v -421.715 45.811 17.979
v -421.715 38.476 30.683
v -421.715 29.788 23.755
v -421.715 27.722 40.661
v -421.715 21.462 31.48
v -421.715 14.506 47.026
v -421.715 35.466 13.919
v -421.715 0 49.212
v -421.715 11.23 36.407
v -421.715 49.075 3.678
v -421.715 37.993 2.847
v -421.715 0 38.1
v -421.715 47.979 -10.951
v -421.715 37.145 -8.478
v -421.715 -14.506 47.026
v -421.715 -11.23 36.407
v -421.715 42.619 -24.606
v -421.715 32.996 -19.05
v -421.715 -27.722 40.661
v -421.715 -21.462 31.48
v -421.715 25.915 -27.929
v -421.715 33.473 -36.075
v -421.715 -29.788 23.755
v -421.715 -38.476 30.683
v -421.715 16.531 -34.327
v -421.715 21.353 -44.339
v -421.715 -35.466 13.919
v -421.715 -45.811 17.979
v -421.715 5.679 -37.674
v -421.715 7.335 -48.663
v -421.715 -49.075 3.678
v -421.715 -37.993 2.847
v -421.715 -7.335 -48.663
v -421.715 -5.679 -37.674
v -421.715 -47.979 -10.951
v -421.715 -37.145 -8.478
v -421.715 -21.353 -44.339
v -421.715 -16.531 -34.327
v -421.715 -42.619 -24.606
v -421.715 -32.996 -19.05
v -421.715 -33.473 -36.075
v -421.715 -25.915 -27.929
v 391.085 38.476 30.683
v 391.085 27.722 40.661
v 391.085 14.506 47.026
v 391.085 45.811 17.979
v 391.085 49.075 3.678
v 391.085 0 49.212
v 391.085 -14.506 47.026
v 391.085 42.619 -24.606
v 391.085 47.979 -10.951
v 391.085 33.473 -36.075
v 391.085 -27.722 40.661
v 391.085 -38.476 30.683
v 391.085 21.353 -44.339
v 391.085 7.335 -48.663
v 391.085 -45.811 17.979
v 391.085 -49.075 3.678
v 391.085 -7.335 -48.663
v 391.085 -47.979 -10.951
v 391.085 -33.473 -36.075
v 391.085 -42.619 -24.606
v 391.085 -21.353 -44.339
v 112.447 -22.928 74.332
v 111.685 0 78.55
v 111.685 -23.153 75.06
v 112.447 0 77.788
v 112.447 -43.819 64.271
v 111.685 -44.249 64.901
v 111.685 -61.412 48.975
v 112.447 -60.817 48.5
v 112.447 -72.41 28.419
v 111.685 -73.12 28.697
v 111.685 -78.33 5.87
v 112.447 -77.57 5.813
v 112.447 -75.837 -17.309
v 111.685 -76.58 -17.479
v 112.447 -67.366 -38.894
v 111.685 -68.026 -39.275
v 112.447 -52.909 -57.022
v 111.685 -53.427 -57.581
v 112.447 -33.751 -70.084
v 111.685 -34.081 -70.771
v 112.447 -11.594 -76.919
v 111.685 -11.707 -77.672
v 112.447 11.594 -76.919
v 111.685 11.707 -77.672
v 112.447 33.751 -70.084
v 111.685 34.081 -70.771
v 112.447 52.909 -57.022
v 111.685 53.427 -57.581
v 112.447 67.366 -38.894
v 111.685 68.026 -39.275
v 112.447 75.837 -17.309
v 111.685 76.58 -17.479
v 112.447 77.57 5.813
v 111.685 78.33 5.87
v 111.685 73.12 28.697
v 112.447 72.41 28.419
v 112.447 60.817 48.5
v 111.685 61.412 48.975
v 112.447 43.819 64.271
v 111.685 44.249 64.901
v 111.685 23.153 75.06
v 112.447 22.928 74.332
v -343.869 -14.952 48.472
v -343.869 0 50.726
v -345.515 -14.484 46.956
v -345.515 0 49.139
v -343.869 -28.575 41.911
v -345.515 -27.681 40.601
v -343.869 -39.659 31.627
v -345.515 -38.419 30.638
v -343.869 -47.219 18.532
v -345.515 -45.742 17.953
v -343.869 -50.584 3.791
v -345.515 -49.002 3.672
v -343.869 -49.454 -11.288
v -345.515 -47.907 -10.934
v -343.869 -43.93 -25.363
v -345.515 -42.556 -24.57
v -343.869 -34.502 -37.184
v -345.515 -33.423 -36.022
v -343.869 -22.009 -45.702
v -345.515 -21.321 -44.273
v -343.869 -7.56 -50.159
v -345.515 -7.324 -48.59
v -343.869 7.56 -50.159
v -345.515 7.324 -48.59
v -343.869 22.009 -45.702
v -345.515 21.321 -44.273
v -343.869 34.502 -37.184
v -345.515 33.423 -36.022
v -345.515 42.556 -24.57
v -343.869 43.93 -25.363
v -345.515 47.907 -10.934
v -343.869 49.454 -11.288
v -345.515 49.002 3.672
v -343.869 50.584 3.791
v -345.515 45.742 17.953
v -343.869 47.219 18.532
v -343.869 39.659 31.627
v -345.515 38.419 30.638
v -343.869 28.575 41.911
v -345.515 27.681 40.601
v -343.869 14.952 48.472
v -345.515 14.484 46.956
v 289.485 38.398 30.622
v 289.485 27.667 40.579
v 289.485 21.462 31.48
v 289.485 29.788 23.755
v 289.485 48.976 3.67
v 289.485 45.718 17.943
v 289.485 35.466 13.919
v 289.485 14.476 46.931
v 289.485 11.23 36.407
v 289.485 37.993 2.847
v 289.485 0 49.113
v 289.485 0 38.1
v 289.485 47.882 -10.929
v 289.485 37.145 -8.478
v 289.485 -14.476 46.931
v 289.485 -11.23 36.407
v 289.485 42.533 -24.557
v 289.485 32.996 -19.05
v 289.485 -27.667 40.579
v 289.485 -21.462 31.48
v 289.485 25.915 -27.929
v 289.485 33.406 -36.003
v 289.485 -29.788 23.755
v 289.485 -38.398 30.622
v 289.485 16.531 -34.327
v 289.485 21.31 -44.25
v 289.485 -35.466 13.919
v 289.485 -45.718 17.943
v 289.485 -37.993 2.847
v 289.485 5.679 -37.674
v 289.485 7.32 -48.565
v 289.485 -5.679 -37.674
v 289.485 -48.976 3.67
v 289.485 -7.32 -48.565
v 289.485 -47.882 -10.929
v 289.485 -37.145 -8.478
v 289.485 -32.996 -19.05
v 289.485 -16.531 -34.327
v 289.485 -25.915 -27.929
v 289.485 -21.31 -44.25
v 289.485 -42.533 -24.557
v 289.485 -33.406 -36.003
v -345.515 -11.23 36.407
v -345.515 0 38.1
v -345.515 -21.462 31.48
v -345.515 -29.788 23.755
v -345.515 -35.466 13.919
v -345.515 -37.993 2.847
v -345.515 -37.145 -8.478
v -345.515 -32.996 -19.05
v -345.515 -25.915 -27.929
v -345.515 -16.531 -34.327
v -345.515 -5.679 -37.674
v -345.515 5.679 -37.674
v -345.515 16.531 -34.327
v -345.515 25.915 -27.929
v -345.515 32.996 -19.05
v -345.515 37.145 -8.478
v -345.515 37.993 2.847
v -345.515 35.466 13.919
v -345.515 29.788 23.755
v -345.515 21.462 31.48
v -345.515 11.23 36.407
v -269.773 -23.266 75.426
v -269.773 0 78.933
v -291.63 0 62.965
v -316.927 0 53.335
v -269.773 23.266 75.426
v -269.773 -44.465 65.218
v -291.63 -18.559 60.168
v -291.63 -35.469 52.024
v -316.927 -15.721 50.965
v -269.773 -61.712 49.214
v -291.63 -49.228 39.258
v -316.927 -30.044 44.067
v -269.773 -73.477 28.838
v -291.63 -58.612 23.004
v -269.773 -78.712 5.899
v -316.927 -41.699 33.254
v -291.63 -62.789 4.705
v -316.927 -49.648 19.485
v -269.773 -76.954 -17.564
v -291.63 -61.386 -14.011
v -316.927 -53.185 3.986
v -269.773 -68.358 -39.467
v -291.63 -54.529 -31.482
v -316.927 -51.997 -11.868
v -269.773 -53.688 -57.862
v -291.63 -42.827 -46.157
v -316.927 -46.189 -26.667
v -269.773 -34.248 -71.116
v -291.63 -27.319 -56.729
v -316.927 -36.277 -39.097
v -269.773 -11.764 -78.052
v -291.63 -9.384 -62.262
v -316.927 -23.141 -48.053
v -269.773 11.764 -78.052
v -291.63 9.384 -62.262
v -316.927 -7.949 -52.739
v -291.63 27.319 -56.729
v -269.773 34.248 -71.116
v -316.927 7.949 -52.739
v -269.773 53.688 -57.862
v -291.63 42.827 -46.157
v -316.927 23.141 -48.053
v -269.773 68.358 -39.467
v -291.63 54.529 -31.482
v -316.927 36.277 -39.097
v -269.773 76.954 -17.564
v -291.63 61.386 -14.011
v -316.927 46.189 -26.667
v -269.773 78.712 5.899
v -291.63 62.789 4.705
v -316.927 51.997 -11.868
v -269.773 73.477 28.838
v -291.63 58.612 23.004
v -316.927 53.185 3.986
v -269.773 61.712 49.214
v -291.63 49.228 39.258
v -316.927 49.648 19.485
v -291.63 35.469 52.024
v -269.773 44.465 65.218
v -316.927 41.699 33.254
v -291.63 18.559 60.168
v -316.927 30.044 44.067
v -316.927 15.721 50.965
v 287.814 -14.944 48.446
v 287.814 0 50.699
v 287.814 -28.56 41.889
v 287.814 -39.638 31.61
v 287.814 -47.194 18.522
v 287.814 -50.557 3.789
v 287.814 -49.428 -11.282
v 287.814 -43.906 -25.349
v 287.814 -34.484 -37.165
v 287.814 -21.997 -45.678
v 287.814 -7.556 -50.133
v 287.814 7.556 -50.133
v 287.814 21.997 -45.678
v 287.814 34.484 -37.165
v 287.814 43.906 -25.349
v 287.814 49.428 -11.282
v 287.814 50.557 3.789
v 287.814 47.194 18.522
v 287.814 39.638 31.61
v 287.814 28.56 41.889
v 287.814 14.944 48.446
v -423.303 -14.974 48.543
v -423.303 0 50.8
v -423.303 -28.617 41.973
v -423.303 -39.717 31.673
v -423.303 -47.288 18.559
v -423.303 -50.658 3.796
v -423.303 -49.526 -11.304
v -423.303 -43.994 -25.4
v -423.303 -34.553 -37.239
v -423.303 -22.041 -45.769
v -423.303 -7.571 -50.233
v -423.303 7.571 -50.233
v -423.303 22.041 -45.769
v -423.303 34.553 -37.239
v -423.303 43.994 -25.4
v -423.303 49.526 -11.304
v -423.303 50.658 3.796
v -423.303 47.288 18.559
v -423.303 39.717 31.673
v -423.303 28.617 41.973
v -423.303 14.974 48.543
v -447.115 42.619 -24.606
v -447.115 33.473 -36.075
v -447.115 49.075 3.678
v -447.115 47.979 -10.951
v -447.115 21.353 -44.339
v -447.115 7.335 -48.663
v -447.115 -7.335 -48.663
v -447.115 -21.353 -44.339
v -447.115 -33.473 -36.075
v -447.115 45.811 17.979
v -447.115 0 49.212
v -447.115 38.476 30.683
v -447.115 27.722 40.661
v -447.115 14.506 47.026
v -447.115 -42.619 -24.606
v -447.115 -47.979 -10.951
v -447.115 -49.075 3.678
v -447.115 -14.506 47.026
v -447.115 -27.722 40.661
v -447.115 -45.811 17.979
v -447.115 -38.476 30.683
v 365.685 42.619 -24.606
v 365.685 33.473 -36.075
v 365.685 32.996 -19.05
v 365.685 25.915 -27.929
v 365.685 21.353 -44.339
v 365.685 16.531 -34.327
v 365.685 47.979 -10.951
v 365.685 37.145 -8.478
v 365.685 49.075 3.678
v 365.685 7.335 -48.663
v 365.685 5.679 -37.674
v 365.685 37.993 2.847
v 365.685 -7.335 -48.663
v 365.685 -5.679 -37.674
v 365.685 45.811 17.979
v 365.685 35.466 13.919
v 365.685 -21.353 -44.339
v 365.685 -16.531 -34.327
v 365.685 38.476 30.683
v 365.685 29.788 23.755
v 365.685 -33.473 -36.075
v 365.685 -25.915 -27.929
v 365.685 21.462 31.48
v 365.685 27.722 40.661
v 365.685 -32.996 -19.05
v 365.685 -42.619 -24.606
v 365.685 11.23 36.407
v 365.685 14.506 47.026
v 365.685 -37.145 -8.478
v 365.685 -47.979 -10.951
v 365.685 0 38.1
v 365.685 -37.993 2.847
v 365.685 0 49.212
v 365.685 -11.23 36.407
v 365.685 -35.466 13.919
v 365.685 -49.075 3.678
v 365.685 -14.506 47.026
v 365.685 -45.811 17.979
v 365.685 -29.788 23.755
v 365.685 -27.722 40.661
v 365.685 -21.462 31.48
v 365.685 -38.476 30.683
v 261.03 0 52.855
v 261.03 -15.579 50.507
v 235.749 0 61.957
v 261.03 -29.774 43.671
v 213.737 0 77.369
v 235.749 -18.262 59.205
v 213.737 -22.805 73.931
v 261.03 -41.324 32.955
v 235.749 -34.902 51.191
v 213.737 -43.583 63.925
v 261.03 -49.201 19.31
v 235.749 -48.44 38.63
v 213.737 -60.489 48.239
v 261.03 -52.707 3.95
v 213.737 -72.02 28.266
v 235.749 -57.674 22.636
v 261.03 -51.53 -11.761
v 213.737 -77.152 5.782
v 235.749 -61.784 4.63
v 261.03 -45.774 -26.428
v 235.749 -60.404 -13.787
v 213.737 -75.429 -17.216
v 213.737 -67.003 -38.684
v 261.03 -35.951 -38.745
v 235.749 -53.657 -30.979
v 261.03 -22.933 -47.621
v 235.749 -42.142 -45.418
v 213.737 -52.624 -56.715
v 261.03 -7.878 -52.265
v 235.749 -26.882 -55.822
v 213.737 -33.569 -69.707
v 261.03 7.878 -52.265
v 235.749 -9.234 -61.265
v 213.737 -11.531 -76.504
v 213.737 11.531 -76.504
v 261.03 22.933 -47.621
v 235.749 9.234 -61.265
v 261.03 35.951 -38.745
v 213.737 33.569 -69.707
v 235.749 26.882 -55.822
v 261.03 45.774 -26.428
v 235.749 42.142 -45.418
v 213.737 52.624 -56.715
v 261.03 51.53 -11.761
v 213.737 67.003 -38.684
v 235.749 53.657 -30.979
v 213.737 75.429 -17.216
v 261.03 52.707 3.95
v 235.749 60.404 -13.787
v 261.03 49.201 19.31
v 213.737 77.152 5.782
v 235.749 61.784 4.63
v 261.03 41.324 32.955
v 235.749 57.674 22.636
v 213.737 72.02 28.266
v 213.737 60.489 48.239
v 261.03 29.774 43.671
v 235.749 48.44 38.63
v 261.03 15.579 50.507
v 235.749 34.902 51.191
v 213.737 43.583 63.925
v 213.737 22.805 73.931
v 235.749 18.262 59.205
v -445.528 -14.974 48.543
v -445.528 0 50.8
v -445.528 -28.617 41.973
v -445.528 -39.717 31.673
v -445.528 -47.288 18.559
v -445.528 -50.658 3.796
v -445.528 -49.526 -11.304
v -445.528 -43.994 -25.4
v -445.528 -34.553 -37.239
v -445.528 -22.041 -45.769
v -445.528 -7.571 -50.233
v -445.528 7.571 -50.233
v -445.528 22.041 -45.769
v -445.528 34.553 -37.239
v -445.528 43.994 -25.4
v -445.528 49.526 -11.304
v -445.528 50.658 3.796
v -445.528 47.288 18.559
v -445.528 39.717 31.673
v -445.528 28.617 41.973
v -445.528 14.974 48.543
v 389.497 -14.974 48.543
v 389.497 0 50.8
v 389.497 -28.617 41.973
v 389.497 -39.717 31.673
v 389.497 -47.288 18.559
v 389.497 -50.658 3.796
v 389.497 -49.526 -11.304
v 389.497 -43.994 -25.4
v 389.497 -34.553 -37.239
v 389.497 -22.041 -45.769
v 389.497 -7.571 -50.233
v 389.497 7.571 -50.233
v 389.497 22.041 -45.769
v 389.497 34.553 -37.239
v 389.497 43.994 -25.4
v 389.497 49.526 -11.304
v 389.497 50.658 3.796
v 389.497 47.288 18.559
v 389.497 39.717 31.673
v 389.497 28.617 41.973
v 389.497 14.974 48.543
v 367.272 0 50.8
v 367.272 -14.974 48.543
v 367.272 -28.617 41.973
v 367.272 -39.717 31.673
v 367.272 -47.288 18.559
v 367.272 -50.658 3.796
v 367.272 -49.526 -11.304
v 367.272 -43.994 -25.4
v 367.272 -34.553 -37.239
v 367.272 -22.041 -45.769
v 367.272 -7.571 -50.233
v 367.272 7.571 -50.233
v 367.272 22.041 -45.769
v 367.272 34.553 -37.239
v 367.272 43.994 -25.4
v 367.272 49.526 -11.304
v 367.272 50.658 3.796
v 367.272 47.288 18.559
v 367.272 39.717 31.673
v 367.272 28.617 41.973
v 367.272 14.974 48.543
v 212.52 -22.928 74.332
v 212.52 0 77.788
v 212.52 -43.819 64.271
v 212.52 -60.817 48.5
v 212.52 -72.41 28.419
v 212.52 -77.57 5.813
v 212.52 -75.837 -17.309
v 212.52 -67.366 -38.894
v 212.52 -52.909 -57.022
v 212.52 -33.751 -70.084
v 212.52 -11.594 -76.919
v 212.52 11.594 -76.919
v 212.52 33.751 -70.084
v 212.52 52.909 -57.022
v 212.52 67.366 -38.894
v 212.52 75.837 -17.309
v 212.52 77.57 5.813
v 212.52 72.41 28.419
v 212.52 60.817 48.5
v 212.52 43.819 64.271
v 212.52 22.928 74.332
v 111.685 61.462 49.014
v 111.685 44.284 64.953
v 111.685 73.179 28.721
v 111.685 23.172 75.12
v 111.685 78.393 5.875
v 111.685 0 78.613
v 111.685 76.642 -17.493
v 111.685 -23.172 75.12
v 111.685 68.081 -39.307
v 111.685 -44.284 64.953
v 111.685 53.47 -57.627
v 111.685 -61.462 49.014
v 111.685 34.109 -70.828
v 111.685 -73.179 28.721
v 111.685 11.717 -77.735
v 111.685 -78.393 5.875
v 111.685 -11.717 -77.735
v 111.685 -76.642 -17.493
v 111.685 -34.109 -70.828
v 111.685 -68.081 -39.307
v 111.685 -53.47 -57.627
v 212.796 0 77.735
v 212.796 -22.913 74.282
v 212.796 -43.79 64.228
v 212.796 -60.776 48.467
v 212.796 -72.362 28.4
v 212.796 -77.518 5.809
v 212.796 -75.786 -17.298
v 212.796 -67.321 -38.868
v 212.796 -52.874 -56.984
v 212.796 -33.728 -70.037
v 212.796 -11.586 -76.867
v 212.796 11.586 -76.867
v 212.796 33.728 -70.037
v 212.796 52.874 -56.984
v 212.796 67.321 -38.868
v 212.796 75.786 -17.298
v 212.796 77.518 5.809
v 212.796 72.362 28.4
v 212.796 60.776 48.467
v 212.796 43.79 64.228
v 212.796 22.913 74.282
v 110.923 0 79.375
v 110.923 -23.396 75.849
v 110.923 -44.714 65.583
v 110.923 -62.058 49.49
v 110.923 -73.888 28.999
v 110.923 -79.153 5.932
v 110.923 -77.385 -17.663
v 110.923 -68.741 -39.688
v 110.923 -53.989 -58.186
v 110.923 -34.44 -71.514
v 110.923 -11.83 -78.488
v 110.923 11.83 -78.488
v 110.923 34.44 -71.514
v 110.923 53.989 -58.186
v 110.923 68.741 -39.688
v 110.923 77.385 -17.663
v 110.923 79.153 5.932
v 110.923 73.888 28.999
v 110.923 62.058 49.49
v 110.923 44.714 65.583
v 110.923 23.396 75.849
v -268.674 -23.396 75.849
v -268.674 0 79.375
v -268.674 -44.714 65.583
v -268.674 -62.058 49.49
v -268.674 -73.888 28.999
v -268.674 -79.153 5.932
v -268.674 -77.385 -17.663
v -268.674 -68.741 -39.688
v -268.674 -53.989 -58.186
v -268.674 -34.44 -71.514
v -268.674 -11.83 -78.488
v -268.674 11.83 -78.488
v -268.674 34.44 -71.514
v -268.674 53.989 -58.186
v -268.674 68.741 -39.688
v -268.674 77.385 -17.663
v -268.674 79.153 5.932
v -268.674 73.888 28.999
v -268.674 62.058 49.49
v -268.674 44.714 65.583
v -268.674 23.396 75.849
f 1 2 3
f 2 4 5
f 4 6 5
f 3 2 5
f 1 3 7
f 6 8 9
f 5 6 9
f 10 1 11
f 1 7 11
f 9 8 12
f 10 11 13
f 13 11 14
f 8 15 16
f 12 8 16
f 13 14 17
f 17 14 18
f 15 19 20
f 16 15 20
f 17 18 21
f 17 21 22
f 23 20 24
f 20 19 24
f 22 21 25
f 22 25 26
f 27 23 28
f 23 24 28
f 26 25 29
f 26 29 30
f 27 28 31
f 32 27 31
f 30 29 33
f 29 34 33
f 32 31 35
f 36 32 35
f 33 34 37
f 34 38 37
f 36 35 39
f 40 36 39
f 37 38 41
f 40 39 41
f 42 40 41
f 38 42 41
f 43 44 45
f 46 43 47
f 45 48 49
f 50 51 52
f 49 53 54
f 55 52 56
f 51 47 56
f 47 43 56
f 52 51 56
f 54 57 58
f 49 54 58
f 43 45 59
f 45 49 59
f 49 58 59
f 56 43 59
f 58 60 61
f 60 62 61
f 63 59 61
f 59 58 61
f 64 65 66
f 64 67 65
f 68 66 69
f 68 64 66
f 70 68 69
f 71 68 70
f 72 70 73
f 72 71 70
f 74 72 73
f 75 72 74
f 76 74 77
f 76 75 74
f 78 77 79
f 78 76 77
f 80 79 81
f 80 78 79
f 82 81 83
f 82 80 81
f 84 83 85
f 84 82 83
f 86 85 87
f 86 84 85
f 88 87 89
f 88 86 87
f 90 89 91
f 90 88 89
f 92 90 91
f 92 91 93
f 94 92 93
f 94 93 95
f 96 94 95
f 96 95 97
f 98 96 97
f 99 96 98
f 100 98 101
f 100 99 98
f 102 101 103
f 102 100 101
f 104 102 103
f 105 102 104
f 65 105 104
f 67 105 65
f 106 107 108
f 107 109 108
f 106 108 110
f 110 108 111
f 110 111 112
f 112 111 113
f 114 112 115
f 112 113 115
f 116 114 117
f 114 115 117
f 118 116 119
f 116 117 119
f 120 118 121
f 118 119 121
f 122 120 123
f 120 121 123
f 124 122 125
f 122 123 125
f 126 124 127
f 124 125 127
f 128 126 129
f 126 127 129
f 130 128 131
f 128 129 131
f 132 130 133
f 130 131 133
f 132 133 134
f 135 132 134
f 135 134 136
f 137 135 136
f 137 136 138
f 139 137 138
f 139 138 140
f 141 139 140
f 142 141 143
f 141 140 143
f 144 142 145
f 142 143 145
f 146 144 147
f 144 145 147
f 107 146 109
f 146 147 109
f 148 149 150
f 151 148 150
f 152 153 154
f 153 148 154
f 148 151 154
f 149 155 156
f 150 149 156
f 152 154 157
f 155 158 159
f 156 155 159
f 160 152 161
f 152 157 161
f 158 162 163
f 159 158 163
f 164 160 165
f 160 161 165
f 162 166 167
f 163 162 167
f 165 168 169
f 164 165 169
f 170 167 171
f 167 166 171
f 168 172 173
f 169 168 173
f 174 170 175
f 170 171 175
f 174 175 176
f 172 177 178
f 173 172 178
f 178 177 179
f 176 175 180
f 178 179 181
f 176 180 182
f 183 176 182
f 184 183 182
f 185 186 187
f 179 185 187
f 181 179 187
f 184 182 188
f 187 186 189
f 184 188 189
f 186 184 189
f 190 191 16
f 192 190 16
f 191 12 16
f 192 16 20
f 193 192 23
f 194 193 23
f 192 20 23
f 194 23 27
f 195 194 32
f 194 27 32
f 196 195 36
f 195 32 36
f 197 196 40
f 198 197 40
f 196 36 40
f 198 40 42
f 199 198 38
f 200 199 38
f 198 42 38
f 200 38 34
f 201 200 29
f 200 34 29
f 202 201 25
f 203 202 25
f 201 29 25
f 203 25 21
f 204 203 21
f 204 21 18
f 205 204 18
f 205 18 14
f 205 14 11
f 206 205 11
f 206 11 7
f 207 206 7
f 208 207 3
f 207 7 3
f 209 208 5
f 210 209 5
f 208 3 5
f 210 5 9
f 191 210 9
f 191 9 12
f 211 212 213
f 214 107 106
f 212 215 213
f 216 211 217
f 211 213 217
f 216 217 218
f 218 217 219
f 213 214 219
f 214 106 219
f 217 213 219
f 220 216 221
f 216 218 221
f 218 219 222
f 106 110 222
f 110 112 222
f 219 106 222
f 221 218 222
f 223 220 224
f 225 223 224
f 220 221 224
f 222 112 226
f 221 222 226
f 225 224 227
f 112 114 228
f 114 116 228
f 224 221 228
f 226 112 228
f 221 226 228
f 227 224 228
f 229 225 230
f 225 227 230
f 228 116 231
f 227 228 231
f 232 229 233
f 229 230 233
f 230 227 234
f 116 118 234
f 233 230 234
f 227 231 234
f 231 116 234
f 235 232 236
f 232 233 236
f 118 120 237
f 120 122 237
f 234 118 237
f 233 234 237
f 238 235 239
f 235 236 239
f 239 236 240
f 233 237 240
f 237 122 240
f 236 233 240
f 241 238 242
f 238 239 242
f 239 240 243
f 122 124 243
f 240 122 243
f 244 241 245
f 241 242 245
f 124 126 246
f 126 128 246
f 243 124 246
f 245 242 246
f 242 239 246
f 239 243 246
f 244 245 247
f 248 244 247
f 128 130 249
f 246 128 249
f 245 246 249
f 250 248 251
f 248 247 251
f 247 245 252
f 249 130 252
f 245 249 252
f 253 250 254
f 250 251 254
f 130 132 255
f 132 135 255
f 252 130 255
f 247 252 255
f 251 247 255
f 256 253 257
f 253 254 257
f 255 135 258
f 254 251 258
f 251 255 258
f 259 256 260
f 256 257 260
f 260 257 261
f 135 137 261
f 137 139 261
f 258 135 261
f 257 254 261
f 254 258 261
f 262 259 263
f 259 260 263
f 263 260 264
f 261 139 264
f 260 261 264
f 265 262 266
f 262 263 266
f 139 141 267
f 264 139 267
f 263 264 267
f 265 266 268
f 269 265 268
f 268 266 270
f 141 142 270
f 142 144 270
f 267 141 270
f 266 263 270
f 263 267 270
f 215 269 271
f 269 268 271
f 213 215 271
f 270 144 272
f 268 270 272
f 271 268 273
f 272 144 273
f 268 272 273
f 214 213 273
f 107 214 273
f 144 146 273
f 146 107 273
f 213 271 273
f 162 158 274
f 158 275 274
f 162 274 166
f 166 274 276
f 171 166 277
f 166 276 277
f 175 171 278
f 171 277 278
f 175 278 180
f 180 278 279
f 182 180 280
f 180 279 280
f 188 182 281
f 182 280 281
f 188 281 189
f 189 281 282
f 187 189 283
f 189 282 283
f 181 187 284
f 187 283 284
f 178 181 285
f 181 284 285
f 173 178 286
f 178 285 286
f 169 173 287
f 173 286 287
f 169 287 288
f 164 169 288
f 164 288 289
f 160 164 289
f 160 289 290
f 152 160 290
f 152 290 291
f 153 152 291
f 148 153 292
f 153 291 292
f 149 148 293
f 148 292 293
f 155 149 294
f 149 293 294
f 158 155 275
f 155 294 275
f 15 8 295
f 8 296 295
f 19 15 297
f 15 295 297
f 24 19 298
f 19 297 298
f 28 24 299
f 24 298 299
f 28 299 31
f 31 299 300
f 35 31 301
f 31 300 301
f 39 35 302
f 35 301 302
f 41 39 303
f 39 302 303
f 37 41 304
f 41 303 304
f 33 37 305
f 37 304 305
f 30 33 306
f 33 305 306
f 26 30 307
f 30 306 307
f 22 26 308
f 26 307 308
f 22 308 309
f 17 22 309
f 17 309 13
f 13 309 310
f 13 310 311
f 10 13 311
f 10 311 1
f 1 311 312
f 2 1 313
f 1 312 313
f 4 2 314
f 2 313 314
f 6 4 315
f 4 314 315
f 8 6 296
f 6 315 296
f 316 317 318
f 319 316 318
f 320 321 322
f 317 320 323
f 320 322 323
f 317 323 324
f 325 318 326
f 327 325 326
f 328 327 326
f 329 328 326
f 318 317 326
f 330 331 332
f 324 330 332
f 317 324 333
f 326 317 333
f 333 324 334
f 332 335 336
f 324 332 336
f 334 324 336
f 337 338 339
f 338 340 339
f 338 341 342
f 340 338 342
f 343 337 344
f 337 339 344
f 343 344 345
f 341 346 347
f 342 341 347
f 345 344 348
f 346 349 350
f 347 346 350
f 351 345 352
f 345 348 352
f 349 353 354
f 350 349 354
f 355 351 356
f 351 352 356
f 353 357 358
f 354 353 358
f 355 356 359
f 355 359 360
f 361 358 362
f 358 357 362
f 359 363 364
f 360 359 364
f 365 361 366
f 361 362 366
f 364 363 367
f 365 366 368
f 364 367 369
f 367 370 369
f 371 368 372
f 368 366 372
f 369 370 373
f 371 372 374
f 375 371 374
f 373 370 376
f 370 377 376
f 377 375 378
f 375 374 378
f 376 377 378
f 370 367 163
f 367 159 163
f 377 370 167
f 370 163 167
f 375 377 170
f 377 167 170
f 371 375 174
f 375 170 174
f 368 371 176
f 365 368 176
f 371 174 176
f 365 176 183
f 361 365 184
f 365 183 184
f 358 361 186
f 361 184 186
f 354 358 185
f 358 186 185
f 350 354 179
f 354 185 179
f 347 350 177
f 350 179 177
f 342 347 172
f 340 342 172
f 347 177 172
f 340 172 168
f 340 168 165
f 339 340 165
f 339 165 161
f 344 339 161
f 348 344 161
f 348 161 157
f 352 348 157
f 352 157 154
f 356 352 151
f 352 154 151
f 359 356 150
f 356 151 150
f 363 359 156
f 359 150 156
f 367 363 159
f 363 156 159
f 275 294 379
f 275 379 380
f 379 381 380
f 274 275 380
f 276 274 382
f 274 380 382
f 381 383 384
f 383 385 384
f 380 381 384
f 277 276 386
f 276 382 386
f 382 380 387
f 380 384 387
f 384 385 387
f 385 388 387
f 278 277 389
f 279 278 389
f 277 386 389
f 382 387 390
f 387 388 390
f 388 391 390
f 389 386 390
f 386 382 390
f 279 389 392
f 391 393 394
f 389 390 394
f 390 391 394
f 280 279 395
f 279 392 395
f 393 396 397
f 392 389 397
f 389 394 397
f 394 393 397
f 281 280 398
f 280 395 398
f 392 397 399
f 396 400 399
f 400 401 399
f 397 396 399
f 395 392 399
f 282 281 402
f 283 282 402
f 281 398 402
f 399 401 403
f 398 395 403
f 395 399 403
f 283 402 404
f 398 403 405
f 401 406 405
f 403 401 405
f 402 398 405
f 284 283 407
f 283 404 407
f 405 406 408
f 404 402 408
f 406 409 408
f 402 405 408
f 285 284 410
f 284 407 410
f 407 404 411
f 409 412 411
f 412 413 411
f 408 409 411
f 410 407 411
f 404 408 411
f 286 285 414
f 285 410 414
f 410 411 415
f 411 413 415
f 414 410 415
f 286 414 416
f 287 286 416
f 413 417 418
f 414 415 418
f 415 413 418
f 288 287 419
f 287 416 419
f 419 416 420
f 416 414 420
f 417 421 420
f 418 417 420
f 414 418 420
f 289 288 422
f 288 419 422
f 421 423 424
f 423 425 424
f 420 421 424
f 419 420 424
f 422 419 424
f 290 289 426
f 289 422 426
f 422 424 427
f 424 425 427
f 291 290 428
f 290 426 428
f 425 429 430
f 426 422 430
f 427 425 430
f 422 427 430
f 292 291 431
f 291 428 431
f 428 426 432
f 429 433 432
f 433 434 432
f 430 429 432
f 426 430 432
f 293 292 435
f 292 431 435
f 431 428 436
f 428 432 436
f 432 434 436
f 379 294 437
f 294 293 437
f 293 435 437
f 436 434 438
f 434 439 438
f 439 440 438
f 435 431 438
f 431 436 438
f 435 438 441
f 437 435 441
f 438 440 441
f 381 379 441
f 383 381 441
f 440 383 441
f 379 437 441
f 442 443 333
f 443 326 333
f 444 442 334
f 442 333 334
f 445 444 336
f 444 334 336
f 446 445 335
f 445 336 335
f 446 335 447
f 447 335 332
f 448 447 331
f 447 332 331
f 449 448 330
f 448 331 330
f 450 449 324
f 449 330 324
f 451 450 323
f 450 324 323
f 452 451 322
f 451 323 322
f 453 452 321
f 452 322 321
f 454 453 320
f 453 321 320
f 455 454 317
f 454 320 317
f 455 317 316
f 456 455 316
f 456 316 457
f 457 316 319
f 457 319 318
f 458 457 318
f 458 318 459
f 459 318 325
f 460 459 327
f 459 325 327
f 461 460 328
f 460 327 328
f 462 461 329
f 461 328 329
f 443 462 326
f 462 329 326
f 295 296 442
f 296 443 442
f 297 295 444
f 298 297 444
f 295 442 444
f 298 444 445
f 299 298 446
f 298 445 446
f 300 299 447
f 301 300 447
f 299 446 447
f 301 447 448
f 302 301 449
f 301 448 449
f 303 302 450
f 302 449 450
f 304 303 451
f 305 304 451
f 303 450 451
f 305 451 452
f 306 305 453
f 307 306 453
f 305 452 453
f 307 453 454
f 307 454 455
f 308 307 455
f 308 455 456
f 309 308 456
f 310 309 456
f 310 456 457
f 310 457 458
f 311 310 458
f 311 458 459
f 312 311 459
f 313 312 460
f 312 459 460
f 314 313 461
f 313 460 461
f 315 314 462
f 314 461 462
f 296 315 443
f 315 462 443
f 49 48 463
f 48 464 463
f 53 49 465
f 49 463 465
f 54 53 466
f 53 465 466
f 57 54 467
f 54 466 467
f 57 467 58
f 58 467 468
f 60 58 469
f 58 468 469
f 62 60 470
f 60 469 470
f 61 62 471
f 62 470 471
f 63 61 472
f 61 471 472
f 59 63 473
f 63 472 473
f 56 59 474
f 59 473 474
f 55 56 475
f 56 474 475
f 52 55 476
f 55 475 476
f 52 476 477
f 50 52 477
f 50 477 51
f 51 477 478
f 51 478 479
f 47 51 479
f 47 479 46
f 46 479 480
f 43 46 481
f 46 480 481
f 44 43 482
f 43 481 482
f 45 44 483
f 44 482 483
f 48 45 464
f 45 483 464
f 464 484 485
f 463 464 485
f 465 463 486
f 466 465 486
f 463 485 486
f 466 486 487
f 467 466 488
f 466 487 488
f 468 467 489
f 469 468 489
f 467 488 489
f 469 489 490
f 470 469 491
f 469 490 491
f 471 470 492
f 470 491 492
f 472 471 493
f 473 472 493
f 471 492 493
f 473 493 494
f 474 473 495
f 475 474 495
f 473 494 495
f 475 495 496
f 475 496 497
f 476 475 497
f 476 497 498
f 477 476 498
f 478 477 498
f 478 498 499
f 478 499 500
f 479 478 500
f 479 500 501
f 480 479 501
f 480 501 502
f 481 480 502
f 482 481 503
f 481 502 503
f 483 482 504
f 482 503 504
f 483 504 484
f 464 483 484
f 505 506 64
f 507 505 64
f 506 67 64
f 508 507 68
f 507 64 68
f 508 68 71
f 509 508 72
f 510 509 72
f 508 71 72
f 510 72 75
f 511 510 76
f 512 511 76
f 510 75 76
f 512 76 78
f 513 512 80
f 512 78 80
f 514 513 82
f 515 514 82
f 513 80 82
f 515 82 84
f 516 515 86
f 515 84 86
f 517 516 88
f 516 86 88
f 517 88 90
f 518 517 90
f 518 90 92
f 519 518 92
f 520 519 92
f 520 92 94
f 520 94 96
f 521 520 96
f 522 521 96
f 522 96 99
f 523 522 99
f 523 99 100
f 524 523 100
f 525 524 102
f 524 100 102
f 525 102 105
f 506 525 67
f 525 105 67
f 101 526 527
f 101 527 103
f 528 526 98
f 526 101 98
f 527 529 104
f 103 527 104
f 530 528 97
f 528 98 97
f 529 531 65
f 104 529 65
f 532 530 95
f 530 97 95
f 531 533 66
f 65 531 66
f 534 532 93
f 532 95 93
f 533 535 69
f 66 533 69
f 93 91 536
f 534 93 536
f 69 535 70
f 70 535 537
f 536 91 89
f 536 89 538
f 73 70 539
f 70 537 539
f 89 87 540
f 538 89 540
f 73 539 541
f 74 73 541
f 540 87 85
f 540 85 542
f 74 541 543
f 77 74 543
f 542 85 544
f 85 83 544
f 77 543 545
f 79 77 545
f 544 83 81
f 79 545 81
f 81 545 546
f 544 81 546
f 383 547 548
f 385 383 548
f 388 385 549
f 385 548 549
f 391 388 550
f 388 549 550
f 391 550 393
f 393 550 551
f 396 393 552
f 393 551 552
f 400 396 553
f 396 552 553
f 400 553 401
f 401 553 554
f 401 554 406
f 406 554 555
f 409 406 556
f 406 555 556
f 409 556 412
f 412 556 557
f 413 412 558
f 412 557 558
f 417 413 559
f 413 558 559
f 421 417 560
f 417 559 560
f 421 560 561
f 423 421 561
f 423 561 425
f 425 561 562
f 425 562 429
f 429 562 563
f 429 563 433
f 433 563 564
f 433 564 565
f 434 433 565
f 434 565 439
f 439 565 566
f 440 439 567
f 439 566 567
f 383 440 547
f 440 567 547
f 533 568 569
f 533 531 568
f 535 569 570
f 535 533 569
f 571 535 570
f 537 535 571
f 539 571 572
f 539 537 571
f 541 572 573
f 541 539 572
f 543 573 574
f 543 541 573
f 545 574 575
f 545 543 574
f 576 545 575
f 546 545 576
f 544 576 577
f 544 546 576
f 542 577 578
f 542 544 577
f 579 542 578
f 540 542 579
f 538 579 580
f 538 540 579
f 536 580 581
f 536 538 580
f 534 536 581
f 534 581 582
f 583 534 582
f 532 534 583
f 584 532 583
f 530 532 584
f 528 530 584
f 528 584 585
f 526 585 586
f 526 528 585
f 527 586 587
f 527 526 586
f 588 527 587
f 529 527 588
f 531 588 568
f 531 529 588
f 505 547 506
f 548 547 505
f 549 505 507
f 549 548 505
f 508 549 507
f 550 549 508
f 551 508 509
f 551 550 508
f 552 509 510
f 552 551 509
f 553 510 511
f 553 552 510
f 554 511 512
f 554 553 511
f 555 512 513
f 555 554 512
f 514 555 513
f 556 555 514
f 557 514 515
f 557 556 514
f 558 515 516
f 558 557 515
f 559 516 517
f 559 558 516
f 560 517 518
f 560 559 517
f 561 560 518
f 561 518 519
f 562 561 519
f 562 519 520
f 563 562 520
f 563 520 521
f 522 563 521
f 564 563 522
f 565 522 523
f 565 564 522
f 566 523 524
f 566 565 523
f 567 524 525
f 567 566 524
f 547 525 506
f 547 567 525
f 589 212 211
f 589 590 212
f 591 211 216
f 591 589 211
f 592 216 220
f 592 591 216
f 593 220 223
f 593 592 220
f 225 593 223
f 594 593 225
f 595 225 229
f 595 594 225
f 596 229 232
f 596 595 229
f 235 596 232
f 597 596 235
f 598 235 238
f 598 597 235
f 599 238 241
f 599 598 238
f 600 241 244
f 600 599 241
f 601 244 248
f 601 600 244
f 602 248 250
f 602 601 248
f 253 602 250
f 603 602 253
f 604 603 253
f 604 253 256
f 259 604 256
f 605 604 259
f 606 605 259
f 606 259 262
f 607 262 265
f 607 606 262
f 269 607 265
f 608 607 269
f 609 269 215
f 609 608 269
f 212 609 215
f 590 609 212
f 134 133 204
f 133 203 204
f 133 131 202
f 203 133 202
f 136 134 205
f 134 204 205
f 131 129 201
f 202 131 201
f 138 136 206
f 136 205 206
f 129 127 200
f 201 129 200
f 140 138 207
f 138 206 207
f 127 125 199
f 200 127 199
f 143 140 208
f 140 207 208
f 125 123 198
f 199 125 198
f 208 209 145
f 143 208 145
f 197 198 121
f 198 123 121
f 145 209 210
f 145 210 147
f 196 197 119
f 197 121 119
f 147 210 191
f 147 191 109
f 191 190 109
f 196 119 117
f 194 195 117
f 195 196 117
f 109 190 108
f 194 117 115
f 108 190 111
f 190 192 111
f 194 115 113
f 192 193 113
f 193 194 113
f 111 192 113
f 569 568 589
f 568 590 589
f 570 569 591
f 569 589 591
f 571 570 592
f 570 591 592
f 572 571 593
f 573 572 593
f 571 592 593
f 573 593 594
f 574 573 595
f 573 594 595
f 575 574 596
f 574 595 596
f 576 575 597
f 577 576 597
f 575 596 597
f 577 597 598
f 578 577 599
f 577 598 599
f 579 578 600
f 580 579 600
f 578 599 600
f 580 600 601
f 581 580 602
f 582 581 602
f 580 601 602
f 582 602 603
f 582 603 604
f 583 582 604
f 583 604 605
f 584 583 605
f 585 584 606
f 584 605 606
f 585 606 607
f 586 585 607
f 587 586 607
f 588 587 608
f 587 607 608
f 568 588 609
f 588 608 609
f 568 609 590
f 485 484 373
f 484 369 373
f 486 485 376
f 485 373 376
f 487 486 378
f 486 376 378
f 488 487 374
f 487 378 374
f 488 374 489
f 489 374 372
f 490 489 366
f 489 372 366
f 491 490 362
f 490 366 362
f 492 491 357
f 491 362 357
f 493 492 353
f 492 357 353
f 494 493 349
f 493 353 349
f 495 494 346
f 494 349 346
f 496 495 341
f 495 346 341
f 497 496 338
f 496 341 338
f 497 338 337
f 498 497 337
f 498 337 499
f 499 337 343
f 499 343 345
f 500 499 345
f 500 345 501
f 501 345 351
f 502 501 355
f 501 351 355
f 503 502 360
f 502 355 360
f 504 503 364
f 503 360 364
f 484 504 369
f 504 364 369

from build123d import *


# Not quite as in the source:
# - a fillet or chamfer that OpenCascade refuses, or shapes differently, is made with other operations: its cross-section is extruded or revolved along the edge and cut away or added


with BuildPart() as f1:
    # F0 (on Front) → F1 (revolve)
    with BuildSketch(Plane.XZ):
        with BuildLine():
            Line((-447.1154779911, 50.8), (-447.1154779911, 0))
            Line((-447.1154779911, 0), (391.0845220089, 0))
            Line((391.0845220089, 0), (391.0845220089, 50.8))
            Line((391.0845220089, 50.8), (365.6845220089, 50.8))
            Line((365.6845220089, 50.8), (365.6845220089, 38.1))
            Line((365.6845220089, 38.1), (289.4845220089, 38.1))
            Line((289.4845220089, 38.1), (289.4845220089, 50.8))
            ThreePointArc((289.4845220089, 50.8), (248.5849137461, 56.3889737285), (213.2845220089, 77.7875))
            Line((213.2845220089, 77.7875), (111.6845220089, 77.7875))
            Line((111.6845220089, 77.7875), (111.6845220089, 79.375))
            Line((111.6845220089, 79.375), (-269.3154779911, 79.375))
            ThreePointArc((-269.3154779911, 79.375), (-304.4294339656, 57.1247159319), (-345.5154779911, 50.8))
            Line((-345.5154779911, 50.8), (-345.5154779911, 38.1))
            Line((-345.5154779911, 38.1), (-421.7154779911, 38.1))
            Line((-421.7154779911, 38.1), (-421.7154779911, 50.8))
            Line((-421.7154779911, 50.8), (-447.1154779911, 50.8))
        make_face()
    revolve(axis=Axis((-28.0154779911, 0, 0), (1, 0, 0)))

    # F2: chamfer of 1.5875 on 8 edges, made by hand

    # F2_s1 → F2_t2 (revolve, cut)
    with BuildSketch(Plane.XZ):
        Polygon((-445.5279779911, 50.8), (-447.1154779911, 49.2125), (-447.1154779911, 50.8), align=None)
    revolve(axis=Axis((-447.1154779911, 0, 0), (1, 0, 0)), mode=Mode.SUBTRACT)

    # F2_s3 → F2_t4 (revolve, cut)
    with BuildSketch(Plane.XZ):
        Polygon((-421.7154779911, 49.2125), (-423.3029779911, 50.8), (-421.7154779911, 50.8), align=None)
    revolve(axis=Axis((-421.7154779911, 0, 0), (1, 0, 0)), mode=Mode.SUBTRACT)

    # F2_s5 → F2_t6 (revolve, cut)
    with BuildSketch(Plane.XZ):
        with BuildLine():
            Line((-343.8691410317, 50.7255652721), (-345.5154779911, 49.1391559736))
            Line((-345.5154779911, 49.1391559736), (-345.5154779911, 50.8))
            ThreePointArc((-345.5154779911, 50.8), (-344.6706324334, 50.7584599548), (-343.8691410317, 50.7255652721))
        make_face()
    revolve(axis=Axis((-345.5154779911, 0, 0), (1, 0, 0)), mode=Mode.SUBTRACT)

    # F2_s7 → F2_t8 (revolve, cut)
    with BuildSketch(Plane.XZ):
        Polygon((391.0845220089, 49.2125), (389.4970220089, 50.8), (391.0845220089, 50.8), align=None)
    revolve(axis=Axis((391.0845220089, 0, 0), (1, 0, 0)), mode=Mode.SUBTRACT)

    # F2_s9 → F2_t10 (revolve, cut)
    with BuildSketch(Plane.XZ):
        Polygon((367.2720220089, 50.8), (365.6845220089, 49.2125), (365.6845220089, 50.8), align=None)
    revolve(axis=Axis((365.6845220089, 0, 0), (1, 0, 0)), mode=Mode.SUBTRACT)

    # F2_s11 → F2_t12 (revolve, cut)
    with BuildSketch(Plane.XZ):
        with BuildLine():
            Line((289.4845220089, 49.1134387616), (287.8140491072, 50.6987689315))
            ThreePointArc((287.8140491072, 50.6987689315), (288.6278622062, 50.7446363641), (289.4845220089, 50.8))
            Line((289.4845220089, 50.8), (289.4845220089, 49.1134387616))
        make_face()
    revolve(axis=Axis((289.4845220089, 0, 0), (1, 0, 0)), mode=Mode.SUBTRACT)

    # F2_s13 → F2_t14 (revolve, cut)
    with BuildSketch(Plane.XZ):
        with BuildLine():
            Line((213.7373414064, 77.3686138432), (212.6628657503, 77.7875))
            Line((212.6628657503, 77.7875), (213.2845220089, 77.7875))
            ThreePointArc((213.2845220089, 77.7875), (213.5323086027, 77.5576500764), (213.7373414064, 77.3686138432))
        make_face()
    revolve(axis=Axis((213.2845220089, 0, 0), (1, 0, 0)), mode=Mode.SUBTRACT)

    # F2_s15 → F2_t16 (revolve, cut)
    with BuildSketch(Plane.XZ):
        with BuildLine():
            Line((-269.7732330498, 78.9331655442), (-268.6743214469, 79.375))
            Line((-268.6743214469, 79.375), (-269.3154779911, 79.375))
            ThreePointArc((-269.3154779911, 79.375), (-269.5651837952, 79.1332927093), (-269.7732330498, 78.9331655442))
        make_face()
    revolve(axis=Axis((-269.3154779911, 0, 0), (1, 0, 0)), mode=Mode.SUBTRACT)

    # F3: chamfer of 0.762 on 4 edges, made by hand

    # F3_s1 → F3_t2 (revolve)
    with BuildSketch(Plane.XZ):
        Polygon((111.6845220089, 78.5495), (112.4465220089, 77.7875), (111.6845220089, 77.7875), align=None)
    revolve(axis=Axis((111.6845220089, 0, 0), (1, 0, 0)))

    # F3_s3 → F3_t4 (revolve, cut)
    with BuildSketch(Plane.XZ):
        Polygon((110.9225220089, 79.375), (111.6845220089, 78.613), (111.6845220089, 79.375), align=None)
    revolve(axis=Axis((111.6845220089, 0, 0), (1, 0, 0)), mode=Mode.SUBTRACT)

    # F3_s5 → F3_t6 (revolve, cut)
    with BuildSketch(Plane.XZ):
        Polygon((212.5195839157, 77.7875), (212.7963616249, 77.7354564069), (212.6628657503, 77.7875), align=None)
    revolve(axis=Axis((212.6628657503, 0, 0), (1, 0, 0)), mode=Mode.SUBTRACT)


solid = f1.part
